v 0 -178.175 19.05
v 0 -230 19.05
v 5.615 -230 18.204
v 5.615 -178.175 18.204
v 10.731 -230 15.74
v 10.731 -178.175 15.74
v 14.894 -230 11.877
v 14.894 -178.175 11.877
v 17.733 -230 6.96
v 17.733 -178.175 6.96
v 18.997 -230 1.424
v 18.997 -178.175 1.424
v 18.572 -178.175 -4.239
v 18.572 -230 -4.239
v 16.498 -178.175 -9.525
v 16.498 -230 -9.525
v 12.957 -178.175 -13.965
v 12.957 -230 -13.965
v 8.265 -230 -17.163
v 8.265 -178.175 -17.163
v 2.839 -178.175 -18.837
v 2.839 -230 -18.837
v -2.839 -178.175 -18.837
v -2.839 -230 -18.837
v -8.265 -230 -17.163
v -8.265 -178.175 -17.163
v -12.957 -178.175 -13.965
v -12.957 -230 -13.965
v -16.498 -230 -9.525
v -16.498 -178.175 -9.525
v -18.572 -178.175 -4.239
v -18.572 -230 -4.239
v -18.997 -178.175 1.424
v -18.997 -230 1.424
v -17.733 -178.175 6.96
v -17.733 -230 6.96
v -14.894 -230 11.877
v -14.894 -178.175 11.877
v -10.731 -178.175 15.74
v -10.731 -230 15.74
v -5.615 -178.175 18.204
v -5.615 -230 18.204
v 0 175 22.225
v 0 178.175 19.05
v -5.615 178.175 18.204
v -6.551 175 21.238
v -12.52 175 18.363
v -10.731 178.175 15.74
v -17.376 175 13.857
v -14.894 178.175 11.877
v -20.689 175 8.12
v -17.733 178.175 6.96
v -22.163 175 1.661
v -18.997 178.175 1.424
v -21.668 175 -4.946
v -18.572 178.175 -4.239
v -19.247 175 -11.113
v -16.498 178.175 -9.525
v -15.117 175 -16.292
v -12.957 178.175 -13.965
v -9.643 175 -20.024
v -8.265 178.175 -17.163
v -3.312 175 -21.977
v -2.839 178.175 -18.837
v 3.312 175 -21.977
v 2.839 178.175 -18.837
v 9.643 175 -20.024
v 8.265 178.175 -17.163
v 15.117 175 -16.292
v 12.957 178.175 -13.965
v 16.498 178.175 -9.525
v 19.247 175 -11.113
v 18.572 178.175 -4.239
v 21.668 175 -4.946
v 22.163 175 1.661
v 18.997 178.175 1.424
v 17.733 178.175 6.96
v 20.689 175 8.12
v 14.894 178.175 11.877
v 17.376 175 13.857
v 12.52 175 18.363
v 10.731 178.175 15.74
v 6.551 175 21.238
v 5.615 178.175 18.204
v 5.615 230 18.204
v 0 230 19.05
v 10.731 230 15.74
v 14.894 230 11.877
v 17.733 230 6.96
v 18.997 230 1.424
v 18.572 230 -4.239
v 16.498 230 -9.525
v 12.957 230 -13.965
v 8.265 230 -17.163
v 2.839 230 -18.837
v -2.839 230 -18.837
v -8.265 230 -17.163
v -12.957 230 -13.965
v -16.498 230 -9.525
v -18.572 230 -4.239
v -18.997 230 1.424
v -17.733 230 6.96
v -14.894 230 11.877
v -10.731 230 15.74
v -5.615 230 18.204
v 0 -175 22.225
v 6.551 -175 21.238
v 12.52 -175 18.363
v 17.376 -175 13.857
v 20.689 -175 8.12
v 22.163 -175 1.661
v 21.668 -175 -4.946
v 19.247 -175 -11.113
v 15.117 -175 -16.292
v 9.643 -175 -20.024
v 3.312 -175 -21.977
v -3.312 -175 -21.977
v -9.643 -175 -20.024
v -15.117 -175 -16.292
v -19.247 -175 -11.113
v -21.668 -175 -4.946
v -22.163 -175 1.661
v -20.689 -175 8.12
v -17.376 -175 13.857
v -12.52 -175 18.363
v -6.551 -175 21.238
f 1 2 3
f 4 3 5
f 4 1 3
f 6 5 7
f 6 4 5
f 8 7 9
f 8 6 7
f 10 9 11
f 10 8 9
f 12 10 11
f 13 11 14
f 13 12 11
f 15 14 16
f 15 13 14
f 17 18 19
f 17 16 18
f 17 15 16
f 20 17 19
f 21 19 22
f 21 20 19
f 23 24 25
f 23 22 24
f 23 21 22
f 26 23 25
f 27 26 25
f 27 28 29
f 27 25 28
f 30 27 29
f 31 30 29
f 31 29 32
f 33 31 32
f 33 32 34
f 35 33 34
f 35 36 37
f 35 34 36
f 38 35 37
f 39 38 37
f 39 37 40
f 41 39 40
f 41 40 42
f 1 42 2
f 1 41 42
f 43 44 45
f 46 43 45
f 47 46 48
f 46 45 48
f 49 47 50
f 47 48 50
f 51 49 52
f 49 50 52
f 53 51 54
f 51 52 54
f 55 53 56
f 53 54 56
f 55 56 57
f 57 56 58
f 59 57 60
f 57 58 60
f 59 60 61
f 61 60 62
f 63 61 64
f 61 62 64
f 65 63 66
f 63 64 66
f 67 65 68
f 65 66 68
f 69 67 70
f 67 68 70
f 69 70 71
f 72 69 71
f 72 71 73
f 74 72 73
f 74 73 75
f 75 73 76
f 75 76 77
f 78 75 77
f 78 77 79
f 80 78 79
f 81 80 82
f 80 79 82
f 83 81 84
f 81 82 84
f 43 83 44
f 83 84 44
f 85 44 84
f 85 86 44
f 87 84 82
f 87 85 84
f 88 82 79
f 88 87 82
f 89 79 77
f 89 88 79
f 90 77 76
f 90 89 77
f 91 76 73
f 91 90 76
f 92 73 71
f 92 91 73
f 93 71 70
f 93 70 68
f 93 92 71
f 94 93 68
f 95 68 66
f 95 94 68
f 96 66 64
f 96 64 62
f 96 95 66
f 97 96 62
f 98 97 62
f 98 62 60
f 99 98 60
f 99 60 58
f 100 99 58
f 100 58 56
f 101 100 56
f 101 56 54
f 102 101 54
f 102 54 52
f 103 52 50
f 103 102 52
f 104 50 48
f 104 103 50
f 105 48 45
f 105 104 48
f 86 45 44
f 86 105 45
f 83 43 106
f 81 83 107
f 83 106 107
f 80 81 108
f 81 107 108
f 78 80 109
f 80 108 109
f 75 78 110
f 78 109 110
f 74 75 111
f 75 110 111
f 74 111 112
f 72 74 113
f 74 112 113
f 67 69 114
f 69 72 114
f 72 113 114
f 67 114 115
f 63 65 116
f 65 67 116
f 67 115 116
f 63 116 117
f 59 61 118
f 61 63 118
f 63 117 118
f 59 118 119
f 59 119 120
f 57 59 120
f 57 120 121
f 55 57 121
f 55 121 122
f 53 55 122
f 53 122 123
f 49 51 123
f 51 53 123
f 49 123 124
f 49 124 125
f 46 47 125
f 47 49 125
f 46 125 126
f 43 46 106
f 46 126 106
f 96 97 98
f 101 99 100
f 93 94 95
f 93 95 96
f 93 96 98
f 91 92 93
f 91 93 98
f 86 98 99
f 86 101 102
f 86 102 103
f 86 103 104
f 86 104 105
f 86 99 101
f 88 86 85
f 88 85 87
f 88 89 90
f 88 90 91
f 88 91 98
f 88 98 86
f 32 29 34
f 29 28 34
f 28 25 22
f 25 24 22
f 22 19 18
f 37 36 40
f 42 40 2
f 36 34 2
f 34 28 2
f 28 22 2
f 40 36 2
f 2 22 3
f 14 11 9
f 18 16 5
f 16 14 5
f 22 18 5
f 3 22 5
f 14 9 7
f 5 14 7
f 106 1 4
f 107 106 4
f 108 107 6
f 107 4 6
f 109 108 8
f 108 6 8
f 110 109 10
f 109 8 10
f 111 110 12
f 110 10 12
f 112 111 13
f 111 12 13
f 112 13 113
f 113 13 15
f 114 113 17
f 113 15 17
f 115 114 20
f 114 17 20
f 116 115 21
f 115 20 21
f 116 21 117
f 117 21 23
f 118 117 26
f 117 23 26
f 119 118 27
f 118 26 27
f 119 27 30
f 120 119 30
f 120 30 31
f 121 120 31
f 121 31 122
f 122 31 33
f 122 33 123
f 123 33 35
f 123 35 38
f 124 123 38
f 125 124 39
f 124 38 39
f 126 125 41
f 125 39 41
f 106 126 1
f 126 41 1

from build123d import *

# Parameters (mm, degrees)
BOSS_EXTRUDE1_DEPTH      = 230
BOSS_EXTRUDE1_DEPTH_BACK = 230
SKETCH1_R                = 22.225
SKETCH2_R                = 25.4
SKETCH2_R_2              = 19.05
CUT_EXTRUDE1_DEPTH       = 50
CHAMFER1_SIZE            = 5
CUT_EXTRUDE2_START       = -50
SKETCH3_R                = 25.4
SKETCH3_R_2              = 19.05
CUT_EXTRUDE2_DEPTH       = 50
CHAMFER2_SIZE            = 5


with BuildPart() as part:
    # Sketch1 → Boss-Extrude1 (new, two sides: drawn at the far end of the back side and taken through both)
    with BuildSketch(Plane(origin=(0, 0, 0), x_dir=(1, 0, 0), z_dir=(0, 1, 0)).offset(-BOSS_EXTRUDE1_DEPTH_BACK)):
        with Locations(Location((0, 0, 0), (0, 0, 270))):
            Circle(SKETCH1_R)
    extrude(amount=BOSS_EXTRUDE1_DEPTH + BOSS_EXTRUDE1_DEPTH_BACK)

    # Sketch2 → Cut-Extrude1 (cut)
    with BuildSketch(Plane(origin=(0, 230, 0), x_dir=(1, 0, 0), z_dir=(0, 1, 0))):
        Circle(SKETCH2_R)
        with Locations(Location((0, 0, 0), (0, 0, 270))):
            Circle(SKETCH2_R_2, mode=Mode.SUBTRACT)
    extrude(amount=-CUT_EXTRUDE1_DEPTH, mode=Mode.SUBTRACT)

    # Chamfer1
    # the kernel refuses this chamfer: 5 mm, written as the material it takes off along each edge
    with BuildSketch(Plane(origin=(0, 180, 0), x_dir=(0, 0, 1), z_dir=(1, 0, 0))) as chamfer1_piece_1_section:
        Polygon((22.225, CHAMFER1_SIZE), (22.225 - CHAMFER1_SIZE, 0), (22.225, 0), align=None)
    chamfer1_piece_1 = revolve(axis=Axis((0, 180, 0), (0, -1, 0)), mode=Mode.PRIVATE)
    chamfer1_piece_1 = chamfer1_piece_1 - Plane(origin=(0, 176.598584916, 0), x_dir=(0, 0, 1), z_dir=(0, 1, 0)) * Cylinder(19.05, 89, mode=Mode.PRIVATE)
    add(chamfer1_piece_1, mode=Mode.SUBTRACT)

    # Sketch3 → Cut-Extrude2 (cut)
    with BuildSketch(Plane(origin=(0, -230, 0), x_dir=(-1, 0, 0), z_dir=(0, -1, 0)).offset(CUT_EXTRUDE2_START)):
        Circle(SKETCH3_R)
        with Locations(Location((0, 0, 0), (0, 0, 270))):
            Circle(SKETCH3_R_2, mode=Mode.SUBTRACT)
    extrude(amount=CUT_EXTRUDE2_DEPTH, mode=Mode.SUBTRACT)

    # Chamfer2
    # the kernel refuses this chamfer: 5 mm, written as the material it takes off along each edge
    with BuildSketch(Plane(origin=(0, -180, 0), x_dir=(0, 0, 1), z_dir=(-1, 0, 0))) as chamfer2_piece_1_section:
        Polygon((22.225, CHAMFER2_SIZE), (22.225 - CHAMFER2_SIZE, 0), (22.225, 0), align=None)
    chamfer2_piece_1 = revolve(axis=Axis((0, -180, 0), (0, 1, 0)), mode=Mode.PRIVATE)
    chamfer2_piece_1 = chamfer2_piece_1 - Plane(origin=(0, -176.598584916, 0), x_dir=(0, 0, 1), z_dir=(0, 1, 0)) * Cylinder(19.05, 89, mode=Mode.PRIVATE)
    add(chamfer2_piece_1, mode=Mode.SUBTRACT)


solid = part.part
